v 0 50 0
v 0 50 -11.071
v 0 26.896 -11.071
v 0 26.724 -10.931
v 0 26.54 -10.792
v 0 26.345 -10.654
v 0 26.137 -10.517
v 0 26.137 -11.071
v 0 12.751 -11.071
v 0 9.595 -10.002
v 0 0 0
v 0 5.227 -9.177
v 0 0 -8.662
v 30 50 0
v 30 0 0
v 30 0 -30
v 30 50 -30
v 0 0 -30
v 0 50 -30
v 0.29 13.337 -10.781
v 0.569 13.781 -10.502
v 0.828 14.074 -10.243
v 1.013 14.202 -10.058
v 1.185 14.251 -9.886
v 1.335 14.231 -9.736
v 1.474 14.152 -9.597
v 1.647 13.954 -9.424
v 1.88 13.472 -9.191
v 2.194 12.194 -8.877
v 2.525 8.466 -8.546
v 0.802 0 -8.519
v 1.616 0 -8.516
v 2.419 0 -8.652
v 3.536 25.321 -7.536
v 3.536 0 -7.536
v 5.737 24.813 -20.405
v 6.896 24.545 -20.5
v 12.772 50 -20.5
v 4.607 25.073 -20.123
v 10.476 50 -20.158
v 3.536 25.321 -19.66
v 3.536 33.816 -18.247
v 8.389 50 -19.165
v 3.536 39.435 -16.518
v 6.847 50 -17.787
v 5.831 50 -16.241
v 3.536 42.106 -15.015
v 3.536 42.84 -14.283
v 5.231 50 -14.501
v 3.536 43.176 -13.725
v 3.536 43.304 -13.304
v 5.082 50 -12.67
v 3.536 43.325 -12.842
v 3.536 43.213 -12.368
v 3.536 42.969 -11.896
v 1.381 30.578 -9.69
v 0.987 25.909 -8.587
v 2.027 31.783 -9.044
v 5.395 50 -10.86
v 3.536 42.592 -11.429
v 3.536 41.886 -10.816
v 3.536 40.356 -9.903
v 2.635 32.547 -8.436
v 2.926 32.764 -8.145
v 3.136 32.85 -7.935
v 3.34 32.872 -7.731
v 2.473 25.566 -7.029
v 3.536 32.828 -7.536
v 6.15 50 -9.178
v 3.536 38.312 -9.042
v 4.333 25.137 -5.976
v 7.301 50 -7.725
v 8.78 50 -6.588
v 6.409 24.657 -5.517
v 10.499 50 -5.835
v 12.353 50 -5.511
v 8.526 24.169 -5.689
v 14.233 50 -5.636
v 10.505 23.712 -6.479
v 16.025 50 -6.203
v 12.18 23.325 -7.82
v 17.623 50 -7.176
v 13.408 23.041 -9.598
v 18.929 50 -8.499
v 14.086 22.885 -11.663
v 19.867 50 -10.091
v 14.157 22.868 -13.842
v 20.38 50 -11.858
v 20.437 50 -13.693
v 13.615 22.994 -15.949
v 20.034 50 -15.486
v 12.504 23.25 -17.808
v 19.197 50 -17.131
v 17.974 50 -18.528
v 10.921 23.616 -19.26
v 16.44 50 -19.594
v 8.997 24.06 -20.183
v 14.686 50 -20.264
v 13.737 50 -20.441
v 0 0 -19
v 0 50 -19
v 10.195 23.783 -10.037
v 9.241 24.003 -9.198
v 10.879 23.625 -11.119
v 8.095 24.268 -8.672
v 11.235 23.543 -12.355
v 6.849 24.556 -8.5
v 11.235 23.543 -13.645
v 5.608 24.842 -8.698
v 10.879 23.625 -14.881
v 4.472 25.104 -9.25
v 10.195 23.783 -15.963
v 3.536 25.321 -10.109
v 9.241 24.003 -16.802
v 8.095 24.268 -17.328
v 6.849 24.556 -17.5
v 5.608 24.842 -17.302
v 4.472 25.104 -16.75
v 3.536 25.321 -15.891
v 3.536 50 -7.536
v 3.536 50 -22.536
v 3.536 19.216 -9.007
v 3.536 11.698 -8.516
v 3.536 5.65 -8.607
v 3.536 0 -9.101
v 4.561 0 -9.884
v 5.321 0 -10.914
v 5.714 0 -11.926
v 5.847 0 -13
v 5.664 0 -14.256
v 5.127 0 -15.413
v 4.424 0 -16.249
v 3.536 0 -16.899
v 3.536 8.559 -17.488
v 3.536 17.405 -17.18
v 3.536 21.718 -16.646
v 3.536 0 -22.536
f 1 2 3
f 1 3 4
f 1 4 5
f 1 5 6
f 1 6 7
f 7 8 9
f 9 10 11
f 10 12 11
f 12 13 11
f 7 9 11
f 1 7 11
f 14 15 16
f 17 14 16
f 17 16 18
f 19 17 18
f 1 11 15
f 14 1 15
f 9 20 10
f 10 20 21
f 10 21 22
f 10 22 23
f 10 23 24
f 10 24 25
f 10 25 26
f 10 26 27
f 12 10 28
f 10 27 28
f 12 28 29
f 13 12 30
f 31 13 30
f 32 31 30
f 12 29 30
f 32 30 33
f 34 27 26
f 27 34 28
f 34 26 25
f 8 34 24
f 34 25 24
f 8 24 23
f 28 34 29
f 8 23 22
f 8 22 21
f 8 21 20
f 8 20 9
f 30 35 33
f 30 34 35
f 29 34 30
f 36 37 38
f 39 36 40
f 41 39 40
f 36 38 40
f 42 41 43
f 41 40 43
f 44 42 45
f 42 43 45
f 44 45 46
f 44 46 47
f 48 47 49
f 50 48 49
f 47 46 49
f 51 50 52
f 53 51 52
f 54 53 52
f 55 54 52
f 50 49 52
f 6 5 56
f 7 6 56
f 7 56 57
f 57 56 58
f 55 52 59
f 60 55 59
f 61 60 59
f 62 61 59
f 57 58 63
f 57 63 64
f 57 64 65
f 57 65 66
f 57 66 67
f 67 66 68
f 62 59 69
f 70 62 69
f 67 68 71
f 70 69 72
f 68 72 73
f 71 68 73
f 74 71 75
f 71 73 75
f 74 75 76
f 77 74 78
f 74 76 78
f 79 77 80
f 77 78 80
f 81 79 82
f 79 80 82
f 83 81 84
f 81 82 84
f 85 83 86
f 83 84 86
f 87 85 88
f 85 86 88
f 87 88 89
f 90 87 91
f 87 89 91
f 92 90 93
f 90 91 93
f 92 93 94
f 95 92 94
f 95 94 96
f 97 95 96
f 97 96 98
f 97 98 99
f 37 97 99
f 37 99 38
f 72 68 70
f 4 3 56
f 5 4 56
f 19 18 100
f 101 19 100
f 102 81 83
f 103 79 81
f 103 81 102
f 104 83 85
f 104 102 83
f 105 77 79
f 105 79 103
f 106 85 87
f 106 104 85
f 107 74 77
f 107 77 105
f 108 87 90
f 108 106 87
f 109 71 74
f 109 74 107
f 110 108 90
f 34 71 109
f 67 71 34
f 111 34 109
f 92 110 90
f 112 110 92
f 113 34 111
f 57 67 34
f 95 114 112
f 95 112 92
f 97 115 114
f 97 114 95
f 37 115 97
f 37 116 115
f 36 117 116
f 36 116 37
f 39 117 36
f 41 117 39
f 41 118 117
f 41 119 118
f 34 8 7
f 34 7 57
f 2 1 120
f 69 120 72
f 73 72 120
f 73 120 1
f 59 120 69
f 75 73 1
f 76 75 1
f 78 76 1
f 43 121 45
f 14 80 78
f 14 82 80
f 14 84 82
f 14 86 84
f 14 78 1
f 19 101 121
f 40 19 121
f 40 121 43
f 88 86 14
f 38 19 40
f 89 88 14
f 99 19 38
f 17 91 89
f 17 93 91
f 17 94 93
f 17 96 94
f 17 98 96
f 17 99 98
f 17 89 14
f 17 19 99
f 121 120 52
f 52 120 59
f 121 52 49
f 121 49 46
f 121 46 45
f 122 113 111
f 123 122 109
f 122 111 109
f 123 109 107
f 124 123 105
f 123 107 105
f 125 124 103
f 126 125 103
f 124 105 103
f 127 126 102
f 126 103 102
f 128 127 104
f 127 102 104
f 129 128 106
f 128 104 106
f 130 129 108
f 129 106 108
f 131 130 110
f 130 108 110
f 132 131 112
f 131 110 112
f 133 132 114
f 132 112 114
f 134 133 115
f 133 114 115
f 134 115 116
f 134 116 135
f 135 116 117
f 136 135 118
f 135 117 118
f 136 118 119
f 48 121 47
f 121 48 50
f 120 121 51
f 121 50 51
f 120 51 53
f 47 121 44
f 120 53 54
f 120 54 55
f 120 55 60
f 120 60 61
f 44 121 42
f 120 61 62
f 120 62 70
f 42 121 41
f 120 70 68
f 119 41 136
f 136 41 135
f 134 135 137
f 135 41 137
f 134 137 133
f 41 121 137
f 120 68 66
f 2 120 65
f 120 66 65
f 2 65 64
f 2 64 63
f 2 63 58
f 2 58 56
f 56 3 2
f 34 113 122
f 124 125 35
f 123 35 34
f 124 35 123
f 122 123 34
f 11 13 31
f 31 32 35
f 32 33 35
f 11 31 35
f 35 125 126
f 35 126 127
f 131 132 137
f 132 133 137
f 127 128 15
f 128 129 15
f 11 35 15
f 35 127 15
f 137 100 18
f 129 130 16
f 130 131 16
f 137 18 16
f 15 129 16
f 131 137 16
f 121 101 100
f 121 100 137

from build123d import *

# Parameters (mm, degrees)
BOSS_EXTRUDE1_DEPTH = 50
SKETCH4_R           = 7.5
CUT_EXTRUDE1_DEPTH  = 30
SKETCH5_R           = 4.5
CUT_EXTRUDE2_DEPTH  = 26.46703487


with BuildPart() as part:
    # Sketch2 → Boss-Extrude1 (new body)
    with BuildSketch(Plane(origin=(0, 0, 0), x_dir=(1, 0, 0), z_dir=(0, 1, 0))):
        Polygon((3.535533906, 22.535533906), (3.535533906, 7.535533906), (0, 11.071067812), (0, 0), (30, 0), (30, 30), (0, 30), (0, 19), align=None)
    extrude(amount=BOSS_EXTRUDE1_DEPTH)

    # Sketch4 → Cut-Extrude1 (cut)
    with BuildSketch(Plane(origin=(12.477367975, 54.045418359, 0), x_dir=(0, 0, -1), z_dir=(0.224951054, 0.974370065, 0))):
        with Locations((13, -1.197365684)):
            Circle(SKETCH4_R)
    extrude(amount=-CUT_EXTRUDE1_DEPTH, mode=Mode.SUBTRACT)

    # Sketch5 → Cut-Extrude2 (cut, through all)
    with BuildSketch(Plane(origin=(5.728836345, 24.814316416, 0), x_dir=(0.974370065, -0.224951054, 0), z_dir=(0.224951054, 0.974370065, 0))):
        with Locations((1.197365684, 13)):
            Circle(SKETCH5_R)
    extrude(amount=-CUT_EXTRUDE2_DEPTH, mode=Mode.SUBTRACT)


solid = part.part
